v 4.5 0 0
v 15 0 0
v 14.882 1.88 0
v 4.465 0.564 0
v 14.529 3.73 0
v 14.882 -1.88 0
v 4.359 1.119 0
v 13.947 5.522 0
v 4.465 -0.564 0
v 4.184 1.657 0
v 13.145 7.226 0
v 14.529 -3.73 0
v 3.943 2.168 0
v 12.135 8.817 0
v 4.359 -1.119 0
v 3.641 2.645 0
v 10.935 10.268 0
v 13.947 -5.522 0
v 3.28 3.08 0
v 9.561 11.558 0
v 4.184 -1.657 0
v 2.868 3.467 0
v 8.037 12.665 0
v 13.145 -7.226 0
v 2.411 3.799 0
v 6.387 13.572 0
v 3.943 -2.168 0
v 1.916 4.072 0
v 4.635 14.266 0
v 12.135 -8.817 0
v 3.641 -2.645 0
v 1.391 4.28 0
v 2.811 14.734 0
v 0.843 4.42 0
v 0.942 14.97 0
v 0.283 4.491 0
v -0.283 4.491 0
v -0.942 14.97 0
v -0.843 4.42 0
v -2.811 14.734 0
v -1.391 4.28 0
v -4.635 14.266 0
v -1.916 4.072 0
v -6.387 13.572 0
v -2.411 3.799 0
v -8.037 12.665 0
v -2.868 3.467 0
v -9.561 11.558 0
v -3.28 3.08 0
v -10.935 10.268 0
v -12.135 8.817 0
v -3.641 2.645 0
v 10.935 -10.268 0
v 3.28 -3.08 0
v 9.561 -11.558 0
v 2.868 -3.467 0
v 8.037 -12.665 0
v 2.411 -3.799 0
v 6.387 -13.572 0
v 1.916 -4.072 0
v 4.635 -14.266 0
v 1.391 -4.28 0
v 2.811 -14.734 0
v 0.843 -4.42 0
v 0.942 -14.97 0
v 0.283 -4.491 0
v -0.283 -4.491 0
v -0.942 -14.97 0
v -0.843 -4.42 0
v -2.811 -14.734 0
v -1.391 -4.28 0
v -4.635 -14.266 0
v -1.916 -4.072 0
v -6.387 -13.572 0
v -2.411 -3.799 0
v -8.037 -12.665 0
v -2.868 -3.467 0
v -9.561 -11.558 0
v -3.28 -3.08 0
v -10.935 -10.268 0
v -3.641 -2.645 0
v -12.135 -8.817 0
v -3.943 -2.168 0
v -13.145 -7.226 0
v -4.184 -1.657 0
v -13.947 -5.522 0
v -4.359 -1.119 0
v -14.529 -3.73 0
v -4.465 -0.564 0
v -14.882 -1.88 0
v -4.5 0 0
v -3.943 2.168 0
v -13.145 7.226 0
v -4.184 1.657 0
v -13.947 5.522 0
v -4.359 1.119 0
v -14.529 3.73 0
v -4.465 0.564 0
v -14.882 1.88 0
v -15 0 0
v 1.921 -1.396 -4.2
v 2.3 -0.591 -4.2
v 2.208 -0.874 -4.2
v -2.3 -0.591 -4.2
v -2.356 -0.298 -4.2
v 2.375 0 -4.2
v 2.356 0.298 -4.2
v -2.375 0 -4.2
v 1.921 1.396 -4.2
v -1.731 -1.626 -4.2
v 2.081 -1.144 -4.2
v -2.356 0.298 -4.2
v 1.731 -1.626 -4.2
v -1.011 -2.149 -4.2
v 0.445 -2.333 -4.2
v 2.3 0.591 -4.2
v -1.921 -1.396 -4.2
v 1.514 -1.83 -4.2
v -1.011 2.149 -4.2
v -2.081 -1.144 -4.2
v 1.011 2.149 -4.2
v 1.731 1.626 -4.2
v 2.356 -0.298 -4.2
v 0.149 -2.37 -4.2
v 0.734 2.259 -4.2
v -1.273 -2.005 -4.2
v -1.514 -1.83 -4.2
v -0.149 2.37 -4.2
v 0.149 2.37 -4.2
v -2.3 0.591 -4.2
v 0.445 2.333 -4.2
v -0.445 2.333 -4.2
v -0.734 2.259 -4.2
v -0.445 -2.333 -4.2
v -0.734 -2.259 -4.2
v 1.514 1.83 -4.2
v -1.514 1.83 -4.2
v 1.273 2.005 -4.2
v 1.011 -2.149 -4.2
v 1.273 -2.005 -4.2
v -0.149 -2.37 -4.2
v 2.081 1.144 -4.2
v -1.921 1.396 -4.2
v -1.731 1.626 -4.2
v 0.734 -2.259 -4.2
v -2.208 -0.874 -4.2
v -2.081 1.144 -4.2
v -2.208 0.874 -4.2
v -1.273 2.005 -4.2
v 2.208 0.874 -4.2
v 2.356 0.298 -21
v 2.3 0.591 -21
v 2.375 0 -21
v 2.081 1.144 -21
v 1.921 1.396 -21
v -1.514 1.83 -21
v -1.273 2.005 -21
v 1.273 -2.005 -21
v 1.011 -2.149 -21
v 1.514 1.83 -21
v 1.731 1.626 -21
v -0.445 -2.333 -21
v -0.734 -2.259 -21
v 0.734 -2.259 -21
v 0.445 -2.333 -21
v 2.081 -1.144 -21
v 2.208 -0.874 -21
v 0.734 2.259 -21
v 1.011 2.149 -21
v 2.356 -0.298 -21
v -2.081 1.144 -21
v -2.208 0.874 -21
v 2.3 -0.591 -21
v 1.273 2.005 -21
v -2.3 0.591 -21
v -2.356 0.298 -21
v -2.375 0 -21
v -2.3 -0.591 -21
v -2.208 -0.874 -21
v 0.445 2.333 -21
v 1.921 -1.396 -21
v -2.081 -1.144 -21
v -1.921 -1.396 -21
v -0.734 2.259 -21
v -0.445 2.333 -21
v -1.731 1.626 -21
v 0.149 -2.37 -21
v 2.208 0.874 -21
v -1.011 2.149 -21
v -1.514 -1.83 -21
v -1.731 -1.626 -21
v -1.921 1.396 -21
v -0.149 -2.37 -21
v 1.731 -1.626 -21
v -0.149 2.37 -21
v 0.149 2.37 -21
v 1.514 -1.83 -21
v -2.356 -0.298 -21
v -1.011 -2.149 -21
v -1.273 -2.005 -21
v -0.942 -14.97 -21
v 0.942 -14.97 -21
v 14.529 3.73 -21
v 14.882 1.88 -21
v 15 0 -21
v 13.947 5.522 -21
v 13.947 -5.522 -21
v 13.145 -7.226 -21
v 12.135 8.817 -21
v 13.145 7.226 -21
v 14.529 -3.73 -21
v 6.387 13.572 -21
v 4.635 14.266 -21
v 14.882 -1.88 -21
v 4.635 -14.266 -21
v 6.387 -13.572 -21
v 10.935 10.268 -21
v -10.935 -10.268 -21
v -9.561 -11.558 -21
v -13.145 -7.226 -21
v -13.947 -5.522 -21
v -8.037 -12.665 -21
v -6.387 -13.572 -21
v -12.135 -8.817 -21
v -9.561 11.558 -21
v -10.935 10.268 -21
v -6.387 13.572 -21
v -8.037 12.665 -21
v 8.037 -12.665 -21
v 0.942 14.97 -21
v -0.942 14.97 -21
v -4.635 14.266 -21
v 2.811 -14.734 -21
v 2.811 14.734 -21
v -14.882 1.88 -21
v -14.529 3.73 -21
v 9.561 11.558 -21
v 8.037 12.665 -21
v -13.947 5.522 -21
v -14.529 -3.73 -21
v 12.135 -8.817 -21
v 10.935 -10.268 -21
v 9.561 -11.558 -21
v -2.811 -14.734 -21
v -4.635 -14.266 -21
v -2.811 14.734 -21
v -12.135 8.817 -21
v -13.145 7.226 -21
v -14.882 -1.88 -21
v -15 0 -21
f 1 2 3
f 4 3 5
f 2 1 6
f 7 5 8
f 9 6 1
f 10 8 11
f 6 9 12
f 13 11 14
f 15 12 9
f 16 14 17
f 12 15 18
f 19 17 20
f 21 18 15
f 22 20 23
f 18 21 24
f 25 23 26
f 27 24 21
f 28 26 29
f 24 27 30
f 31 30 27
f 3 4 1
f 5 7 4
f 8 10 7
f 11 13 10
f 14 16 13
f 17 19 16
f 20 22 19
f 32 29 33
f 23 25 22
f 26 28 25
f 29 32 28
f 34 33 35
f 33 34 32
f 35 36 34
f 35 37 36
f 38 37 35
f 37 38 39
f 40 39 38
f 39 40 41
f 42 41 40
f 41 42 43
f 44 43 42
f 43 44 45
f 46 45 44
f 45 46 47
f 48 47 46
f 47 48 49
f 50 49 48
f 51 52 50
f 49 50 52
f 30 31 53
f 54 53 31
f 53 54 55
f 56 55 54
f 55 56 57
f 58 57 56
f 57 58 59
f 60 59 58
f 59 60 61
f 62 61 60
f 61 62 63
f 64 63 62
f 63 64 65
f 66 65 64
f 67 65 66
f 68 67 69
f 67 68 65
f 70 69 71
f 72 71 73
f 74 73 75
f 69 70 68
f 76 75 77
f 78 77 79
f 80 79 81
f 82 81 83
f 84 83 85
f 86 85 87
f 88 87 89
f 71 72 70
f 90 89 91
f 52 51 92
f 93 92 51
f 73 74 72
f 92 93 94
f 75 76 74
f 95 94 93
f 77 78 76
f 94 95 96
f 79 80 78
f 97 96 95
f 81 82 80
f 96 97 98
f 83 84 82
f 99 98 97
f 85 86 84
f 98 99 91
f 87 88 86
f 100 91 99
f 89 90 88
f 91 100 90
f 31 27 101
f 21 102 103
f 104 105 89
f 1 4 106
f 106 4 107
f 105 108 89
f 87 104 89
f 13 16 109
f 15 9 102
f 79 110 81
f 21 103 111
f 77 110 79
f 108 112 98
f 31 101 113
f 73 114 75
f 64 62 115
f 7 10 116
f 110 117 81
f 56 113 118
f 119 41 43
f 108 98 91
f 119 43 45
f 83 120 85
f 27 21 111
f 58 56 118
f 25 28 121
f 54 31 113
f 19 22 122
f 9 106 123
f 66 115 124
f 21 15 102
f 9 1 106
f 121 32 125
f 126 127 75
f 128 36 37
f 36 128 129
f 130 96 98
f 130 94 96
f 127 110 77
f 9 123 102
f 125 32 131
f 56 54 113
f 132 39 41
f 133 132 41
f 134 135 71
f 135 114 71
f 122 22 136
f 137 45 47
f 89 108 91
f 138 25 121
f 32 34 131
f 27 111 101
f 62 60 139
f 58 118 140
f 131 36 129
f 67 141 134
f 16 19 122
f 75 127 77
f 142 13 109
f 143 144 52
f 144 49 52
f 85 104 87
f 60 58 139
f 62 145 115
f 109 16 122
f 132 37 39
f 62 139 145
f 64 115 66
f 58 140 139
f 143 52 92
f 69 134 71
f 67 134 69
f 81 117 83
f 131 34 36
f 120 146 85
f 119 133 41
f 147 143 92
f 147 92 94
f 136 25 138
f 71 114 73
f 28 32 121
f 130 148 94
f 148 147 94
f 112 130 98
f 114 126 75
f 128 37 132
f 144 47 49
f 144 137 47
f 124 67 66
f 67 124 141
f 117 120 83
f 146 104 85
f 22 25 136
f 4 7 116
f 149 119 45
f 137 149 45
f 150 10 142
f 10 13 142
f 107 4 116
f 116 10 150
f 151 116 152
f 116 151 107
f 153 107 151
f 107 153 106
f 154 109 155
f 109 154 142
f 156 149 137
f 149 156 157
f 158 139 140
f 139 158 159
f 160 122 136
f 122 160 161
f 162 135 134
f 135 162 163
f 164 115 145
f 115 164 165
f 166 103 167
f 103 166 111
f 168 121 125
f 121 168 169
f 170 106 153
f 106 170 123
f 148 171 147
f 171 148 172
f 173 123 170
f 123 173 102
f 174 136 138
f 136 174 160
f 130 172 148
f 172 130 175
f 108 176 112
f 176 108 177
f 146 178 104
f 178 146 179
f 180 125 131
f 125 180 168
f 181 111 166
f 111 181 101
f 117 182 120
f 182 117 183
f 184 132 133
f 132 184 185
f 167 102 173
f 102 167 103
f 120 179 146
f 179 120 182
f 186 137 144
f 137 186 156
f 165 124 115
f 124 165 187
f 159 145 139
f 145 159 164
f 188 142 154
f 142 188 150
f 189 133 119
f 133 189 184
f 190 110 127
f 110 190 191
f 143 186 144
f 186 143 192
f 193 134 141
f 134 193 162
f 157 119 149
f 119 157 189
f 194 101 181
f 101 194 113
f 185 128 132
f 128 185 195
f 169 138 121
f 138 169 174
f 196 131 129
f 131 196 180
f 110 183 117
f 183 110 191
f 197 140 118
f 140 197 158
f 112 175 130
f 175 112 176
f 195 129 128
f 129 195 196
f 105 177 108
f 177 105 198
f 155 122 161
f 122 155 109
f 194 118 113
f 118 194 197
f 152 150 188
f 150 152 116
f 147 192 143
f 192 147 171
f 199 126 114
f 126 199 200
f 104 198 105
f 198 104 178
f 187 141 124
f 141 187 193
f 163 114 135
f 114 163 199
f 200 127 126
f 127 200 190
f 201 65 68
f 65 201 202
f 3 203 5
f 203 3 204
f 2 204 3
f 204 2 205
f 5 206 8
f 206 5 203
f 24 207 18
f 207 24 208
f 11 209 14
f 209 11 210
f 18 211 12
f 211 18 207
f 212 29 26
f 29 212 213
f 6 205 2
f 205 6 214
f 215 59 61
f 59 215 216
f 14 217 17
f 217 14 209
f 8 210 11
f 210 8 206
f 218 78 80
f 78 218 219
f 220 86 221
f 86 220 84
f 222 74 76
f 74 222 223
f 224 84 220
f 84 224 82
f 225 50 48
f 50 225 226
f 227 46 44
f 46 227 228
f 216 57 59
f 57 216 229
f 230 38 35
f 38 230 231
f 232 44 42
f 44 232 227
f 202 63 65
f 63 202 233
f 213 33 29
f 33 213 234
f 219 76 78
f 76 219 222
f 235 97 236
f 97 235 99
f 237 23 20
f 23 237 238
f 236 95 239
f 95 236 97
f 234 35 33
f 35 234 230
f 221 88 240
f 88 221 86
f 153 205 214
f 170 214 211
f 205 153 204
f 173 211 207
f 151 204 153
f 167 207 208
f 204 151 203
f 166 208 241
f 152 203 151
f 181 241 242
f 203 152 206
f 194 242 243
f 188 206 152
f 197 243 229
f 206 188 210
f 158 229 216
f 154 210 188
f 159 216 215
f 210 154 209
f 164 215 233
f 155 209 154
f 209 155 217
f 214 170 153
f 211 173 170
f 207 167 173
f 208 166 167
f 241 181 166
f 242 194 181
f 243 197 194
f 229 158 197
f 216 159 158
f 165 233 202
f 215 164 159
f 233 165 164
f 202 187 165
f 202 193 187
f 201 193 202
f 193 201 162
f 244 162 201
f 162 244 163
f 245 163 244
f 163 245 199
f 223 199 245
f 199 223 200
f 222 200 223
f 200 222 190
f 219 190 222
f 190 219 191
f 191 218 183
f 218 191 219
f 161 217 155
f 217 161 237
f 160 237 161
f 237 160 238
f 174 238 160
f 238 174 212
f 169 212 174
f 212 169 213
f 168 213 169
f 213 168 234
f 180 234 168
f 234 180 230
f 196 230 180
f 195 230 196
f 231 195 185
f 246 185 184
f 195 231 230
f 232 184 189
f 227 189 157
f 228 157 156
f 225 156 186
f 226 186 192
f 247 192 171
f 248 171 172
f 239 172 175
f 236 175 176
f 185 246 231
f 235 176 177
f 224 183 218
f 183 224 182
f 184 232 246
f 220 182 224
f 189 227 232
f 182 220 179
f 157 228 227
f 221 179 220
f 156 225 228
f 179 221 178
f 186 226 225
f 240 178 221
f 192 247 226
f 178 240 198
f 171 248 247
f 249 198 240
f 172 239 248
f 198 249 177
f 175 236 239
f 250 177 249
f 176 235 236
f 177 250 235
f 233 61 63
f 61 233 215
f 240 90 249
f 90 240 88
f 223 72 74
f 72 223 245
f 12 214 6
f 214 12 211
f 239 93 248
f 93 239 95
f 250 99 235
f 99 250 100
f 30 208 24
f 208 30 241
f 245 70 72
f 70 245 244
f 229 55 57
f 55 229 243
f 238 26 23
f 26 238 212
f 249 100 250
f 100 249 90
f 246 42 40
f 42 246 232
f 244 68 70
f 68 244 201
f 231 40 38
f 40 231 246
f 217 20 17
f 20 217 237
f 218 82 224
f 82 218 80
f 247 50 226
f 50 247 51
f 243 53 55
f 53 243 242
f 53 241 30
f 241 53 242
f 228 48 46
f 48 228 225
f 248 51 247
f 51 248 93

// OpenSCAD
$fn = 50;


difference() {
	union() {
		translate(v = [0, 0, -21.0000000000]) {
			cylinder(h = 21, r = 15.0000000000);
		}
	}
	union() {
		translate(v = [0, 0, 0]) {
			rotate(a = [0, 0, 0]) {
				difference() {
					union() {
						translate(v = [0, 0, -24.0000000000]) {
							cylinder(h = 24, r = 2.2500000000);
						}
						translate(v = [0, 0, -4.2000000000]) {
							cylinder(h = 4.2000000000, r1 = 2.3750000000, r2 = 4.5000000000);
						}
						translate(v = [0, 0, -24.0000000000]) {
							cylinder(h = 24, r = 2.3750000000);
						}
						translate(v = [0, 0, -24.0000000000]) {
							cylinder(h = 24, r = 2.2500000000);
						}
					}
					union();
				}
			}
		}
	}
}
